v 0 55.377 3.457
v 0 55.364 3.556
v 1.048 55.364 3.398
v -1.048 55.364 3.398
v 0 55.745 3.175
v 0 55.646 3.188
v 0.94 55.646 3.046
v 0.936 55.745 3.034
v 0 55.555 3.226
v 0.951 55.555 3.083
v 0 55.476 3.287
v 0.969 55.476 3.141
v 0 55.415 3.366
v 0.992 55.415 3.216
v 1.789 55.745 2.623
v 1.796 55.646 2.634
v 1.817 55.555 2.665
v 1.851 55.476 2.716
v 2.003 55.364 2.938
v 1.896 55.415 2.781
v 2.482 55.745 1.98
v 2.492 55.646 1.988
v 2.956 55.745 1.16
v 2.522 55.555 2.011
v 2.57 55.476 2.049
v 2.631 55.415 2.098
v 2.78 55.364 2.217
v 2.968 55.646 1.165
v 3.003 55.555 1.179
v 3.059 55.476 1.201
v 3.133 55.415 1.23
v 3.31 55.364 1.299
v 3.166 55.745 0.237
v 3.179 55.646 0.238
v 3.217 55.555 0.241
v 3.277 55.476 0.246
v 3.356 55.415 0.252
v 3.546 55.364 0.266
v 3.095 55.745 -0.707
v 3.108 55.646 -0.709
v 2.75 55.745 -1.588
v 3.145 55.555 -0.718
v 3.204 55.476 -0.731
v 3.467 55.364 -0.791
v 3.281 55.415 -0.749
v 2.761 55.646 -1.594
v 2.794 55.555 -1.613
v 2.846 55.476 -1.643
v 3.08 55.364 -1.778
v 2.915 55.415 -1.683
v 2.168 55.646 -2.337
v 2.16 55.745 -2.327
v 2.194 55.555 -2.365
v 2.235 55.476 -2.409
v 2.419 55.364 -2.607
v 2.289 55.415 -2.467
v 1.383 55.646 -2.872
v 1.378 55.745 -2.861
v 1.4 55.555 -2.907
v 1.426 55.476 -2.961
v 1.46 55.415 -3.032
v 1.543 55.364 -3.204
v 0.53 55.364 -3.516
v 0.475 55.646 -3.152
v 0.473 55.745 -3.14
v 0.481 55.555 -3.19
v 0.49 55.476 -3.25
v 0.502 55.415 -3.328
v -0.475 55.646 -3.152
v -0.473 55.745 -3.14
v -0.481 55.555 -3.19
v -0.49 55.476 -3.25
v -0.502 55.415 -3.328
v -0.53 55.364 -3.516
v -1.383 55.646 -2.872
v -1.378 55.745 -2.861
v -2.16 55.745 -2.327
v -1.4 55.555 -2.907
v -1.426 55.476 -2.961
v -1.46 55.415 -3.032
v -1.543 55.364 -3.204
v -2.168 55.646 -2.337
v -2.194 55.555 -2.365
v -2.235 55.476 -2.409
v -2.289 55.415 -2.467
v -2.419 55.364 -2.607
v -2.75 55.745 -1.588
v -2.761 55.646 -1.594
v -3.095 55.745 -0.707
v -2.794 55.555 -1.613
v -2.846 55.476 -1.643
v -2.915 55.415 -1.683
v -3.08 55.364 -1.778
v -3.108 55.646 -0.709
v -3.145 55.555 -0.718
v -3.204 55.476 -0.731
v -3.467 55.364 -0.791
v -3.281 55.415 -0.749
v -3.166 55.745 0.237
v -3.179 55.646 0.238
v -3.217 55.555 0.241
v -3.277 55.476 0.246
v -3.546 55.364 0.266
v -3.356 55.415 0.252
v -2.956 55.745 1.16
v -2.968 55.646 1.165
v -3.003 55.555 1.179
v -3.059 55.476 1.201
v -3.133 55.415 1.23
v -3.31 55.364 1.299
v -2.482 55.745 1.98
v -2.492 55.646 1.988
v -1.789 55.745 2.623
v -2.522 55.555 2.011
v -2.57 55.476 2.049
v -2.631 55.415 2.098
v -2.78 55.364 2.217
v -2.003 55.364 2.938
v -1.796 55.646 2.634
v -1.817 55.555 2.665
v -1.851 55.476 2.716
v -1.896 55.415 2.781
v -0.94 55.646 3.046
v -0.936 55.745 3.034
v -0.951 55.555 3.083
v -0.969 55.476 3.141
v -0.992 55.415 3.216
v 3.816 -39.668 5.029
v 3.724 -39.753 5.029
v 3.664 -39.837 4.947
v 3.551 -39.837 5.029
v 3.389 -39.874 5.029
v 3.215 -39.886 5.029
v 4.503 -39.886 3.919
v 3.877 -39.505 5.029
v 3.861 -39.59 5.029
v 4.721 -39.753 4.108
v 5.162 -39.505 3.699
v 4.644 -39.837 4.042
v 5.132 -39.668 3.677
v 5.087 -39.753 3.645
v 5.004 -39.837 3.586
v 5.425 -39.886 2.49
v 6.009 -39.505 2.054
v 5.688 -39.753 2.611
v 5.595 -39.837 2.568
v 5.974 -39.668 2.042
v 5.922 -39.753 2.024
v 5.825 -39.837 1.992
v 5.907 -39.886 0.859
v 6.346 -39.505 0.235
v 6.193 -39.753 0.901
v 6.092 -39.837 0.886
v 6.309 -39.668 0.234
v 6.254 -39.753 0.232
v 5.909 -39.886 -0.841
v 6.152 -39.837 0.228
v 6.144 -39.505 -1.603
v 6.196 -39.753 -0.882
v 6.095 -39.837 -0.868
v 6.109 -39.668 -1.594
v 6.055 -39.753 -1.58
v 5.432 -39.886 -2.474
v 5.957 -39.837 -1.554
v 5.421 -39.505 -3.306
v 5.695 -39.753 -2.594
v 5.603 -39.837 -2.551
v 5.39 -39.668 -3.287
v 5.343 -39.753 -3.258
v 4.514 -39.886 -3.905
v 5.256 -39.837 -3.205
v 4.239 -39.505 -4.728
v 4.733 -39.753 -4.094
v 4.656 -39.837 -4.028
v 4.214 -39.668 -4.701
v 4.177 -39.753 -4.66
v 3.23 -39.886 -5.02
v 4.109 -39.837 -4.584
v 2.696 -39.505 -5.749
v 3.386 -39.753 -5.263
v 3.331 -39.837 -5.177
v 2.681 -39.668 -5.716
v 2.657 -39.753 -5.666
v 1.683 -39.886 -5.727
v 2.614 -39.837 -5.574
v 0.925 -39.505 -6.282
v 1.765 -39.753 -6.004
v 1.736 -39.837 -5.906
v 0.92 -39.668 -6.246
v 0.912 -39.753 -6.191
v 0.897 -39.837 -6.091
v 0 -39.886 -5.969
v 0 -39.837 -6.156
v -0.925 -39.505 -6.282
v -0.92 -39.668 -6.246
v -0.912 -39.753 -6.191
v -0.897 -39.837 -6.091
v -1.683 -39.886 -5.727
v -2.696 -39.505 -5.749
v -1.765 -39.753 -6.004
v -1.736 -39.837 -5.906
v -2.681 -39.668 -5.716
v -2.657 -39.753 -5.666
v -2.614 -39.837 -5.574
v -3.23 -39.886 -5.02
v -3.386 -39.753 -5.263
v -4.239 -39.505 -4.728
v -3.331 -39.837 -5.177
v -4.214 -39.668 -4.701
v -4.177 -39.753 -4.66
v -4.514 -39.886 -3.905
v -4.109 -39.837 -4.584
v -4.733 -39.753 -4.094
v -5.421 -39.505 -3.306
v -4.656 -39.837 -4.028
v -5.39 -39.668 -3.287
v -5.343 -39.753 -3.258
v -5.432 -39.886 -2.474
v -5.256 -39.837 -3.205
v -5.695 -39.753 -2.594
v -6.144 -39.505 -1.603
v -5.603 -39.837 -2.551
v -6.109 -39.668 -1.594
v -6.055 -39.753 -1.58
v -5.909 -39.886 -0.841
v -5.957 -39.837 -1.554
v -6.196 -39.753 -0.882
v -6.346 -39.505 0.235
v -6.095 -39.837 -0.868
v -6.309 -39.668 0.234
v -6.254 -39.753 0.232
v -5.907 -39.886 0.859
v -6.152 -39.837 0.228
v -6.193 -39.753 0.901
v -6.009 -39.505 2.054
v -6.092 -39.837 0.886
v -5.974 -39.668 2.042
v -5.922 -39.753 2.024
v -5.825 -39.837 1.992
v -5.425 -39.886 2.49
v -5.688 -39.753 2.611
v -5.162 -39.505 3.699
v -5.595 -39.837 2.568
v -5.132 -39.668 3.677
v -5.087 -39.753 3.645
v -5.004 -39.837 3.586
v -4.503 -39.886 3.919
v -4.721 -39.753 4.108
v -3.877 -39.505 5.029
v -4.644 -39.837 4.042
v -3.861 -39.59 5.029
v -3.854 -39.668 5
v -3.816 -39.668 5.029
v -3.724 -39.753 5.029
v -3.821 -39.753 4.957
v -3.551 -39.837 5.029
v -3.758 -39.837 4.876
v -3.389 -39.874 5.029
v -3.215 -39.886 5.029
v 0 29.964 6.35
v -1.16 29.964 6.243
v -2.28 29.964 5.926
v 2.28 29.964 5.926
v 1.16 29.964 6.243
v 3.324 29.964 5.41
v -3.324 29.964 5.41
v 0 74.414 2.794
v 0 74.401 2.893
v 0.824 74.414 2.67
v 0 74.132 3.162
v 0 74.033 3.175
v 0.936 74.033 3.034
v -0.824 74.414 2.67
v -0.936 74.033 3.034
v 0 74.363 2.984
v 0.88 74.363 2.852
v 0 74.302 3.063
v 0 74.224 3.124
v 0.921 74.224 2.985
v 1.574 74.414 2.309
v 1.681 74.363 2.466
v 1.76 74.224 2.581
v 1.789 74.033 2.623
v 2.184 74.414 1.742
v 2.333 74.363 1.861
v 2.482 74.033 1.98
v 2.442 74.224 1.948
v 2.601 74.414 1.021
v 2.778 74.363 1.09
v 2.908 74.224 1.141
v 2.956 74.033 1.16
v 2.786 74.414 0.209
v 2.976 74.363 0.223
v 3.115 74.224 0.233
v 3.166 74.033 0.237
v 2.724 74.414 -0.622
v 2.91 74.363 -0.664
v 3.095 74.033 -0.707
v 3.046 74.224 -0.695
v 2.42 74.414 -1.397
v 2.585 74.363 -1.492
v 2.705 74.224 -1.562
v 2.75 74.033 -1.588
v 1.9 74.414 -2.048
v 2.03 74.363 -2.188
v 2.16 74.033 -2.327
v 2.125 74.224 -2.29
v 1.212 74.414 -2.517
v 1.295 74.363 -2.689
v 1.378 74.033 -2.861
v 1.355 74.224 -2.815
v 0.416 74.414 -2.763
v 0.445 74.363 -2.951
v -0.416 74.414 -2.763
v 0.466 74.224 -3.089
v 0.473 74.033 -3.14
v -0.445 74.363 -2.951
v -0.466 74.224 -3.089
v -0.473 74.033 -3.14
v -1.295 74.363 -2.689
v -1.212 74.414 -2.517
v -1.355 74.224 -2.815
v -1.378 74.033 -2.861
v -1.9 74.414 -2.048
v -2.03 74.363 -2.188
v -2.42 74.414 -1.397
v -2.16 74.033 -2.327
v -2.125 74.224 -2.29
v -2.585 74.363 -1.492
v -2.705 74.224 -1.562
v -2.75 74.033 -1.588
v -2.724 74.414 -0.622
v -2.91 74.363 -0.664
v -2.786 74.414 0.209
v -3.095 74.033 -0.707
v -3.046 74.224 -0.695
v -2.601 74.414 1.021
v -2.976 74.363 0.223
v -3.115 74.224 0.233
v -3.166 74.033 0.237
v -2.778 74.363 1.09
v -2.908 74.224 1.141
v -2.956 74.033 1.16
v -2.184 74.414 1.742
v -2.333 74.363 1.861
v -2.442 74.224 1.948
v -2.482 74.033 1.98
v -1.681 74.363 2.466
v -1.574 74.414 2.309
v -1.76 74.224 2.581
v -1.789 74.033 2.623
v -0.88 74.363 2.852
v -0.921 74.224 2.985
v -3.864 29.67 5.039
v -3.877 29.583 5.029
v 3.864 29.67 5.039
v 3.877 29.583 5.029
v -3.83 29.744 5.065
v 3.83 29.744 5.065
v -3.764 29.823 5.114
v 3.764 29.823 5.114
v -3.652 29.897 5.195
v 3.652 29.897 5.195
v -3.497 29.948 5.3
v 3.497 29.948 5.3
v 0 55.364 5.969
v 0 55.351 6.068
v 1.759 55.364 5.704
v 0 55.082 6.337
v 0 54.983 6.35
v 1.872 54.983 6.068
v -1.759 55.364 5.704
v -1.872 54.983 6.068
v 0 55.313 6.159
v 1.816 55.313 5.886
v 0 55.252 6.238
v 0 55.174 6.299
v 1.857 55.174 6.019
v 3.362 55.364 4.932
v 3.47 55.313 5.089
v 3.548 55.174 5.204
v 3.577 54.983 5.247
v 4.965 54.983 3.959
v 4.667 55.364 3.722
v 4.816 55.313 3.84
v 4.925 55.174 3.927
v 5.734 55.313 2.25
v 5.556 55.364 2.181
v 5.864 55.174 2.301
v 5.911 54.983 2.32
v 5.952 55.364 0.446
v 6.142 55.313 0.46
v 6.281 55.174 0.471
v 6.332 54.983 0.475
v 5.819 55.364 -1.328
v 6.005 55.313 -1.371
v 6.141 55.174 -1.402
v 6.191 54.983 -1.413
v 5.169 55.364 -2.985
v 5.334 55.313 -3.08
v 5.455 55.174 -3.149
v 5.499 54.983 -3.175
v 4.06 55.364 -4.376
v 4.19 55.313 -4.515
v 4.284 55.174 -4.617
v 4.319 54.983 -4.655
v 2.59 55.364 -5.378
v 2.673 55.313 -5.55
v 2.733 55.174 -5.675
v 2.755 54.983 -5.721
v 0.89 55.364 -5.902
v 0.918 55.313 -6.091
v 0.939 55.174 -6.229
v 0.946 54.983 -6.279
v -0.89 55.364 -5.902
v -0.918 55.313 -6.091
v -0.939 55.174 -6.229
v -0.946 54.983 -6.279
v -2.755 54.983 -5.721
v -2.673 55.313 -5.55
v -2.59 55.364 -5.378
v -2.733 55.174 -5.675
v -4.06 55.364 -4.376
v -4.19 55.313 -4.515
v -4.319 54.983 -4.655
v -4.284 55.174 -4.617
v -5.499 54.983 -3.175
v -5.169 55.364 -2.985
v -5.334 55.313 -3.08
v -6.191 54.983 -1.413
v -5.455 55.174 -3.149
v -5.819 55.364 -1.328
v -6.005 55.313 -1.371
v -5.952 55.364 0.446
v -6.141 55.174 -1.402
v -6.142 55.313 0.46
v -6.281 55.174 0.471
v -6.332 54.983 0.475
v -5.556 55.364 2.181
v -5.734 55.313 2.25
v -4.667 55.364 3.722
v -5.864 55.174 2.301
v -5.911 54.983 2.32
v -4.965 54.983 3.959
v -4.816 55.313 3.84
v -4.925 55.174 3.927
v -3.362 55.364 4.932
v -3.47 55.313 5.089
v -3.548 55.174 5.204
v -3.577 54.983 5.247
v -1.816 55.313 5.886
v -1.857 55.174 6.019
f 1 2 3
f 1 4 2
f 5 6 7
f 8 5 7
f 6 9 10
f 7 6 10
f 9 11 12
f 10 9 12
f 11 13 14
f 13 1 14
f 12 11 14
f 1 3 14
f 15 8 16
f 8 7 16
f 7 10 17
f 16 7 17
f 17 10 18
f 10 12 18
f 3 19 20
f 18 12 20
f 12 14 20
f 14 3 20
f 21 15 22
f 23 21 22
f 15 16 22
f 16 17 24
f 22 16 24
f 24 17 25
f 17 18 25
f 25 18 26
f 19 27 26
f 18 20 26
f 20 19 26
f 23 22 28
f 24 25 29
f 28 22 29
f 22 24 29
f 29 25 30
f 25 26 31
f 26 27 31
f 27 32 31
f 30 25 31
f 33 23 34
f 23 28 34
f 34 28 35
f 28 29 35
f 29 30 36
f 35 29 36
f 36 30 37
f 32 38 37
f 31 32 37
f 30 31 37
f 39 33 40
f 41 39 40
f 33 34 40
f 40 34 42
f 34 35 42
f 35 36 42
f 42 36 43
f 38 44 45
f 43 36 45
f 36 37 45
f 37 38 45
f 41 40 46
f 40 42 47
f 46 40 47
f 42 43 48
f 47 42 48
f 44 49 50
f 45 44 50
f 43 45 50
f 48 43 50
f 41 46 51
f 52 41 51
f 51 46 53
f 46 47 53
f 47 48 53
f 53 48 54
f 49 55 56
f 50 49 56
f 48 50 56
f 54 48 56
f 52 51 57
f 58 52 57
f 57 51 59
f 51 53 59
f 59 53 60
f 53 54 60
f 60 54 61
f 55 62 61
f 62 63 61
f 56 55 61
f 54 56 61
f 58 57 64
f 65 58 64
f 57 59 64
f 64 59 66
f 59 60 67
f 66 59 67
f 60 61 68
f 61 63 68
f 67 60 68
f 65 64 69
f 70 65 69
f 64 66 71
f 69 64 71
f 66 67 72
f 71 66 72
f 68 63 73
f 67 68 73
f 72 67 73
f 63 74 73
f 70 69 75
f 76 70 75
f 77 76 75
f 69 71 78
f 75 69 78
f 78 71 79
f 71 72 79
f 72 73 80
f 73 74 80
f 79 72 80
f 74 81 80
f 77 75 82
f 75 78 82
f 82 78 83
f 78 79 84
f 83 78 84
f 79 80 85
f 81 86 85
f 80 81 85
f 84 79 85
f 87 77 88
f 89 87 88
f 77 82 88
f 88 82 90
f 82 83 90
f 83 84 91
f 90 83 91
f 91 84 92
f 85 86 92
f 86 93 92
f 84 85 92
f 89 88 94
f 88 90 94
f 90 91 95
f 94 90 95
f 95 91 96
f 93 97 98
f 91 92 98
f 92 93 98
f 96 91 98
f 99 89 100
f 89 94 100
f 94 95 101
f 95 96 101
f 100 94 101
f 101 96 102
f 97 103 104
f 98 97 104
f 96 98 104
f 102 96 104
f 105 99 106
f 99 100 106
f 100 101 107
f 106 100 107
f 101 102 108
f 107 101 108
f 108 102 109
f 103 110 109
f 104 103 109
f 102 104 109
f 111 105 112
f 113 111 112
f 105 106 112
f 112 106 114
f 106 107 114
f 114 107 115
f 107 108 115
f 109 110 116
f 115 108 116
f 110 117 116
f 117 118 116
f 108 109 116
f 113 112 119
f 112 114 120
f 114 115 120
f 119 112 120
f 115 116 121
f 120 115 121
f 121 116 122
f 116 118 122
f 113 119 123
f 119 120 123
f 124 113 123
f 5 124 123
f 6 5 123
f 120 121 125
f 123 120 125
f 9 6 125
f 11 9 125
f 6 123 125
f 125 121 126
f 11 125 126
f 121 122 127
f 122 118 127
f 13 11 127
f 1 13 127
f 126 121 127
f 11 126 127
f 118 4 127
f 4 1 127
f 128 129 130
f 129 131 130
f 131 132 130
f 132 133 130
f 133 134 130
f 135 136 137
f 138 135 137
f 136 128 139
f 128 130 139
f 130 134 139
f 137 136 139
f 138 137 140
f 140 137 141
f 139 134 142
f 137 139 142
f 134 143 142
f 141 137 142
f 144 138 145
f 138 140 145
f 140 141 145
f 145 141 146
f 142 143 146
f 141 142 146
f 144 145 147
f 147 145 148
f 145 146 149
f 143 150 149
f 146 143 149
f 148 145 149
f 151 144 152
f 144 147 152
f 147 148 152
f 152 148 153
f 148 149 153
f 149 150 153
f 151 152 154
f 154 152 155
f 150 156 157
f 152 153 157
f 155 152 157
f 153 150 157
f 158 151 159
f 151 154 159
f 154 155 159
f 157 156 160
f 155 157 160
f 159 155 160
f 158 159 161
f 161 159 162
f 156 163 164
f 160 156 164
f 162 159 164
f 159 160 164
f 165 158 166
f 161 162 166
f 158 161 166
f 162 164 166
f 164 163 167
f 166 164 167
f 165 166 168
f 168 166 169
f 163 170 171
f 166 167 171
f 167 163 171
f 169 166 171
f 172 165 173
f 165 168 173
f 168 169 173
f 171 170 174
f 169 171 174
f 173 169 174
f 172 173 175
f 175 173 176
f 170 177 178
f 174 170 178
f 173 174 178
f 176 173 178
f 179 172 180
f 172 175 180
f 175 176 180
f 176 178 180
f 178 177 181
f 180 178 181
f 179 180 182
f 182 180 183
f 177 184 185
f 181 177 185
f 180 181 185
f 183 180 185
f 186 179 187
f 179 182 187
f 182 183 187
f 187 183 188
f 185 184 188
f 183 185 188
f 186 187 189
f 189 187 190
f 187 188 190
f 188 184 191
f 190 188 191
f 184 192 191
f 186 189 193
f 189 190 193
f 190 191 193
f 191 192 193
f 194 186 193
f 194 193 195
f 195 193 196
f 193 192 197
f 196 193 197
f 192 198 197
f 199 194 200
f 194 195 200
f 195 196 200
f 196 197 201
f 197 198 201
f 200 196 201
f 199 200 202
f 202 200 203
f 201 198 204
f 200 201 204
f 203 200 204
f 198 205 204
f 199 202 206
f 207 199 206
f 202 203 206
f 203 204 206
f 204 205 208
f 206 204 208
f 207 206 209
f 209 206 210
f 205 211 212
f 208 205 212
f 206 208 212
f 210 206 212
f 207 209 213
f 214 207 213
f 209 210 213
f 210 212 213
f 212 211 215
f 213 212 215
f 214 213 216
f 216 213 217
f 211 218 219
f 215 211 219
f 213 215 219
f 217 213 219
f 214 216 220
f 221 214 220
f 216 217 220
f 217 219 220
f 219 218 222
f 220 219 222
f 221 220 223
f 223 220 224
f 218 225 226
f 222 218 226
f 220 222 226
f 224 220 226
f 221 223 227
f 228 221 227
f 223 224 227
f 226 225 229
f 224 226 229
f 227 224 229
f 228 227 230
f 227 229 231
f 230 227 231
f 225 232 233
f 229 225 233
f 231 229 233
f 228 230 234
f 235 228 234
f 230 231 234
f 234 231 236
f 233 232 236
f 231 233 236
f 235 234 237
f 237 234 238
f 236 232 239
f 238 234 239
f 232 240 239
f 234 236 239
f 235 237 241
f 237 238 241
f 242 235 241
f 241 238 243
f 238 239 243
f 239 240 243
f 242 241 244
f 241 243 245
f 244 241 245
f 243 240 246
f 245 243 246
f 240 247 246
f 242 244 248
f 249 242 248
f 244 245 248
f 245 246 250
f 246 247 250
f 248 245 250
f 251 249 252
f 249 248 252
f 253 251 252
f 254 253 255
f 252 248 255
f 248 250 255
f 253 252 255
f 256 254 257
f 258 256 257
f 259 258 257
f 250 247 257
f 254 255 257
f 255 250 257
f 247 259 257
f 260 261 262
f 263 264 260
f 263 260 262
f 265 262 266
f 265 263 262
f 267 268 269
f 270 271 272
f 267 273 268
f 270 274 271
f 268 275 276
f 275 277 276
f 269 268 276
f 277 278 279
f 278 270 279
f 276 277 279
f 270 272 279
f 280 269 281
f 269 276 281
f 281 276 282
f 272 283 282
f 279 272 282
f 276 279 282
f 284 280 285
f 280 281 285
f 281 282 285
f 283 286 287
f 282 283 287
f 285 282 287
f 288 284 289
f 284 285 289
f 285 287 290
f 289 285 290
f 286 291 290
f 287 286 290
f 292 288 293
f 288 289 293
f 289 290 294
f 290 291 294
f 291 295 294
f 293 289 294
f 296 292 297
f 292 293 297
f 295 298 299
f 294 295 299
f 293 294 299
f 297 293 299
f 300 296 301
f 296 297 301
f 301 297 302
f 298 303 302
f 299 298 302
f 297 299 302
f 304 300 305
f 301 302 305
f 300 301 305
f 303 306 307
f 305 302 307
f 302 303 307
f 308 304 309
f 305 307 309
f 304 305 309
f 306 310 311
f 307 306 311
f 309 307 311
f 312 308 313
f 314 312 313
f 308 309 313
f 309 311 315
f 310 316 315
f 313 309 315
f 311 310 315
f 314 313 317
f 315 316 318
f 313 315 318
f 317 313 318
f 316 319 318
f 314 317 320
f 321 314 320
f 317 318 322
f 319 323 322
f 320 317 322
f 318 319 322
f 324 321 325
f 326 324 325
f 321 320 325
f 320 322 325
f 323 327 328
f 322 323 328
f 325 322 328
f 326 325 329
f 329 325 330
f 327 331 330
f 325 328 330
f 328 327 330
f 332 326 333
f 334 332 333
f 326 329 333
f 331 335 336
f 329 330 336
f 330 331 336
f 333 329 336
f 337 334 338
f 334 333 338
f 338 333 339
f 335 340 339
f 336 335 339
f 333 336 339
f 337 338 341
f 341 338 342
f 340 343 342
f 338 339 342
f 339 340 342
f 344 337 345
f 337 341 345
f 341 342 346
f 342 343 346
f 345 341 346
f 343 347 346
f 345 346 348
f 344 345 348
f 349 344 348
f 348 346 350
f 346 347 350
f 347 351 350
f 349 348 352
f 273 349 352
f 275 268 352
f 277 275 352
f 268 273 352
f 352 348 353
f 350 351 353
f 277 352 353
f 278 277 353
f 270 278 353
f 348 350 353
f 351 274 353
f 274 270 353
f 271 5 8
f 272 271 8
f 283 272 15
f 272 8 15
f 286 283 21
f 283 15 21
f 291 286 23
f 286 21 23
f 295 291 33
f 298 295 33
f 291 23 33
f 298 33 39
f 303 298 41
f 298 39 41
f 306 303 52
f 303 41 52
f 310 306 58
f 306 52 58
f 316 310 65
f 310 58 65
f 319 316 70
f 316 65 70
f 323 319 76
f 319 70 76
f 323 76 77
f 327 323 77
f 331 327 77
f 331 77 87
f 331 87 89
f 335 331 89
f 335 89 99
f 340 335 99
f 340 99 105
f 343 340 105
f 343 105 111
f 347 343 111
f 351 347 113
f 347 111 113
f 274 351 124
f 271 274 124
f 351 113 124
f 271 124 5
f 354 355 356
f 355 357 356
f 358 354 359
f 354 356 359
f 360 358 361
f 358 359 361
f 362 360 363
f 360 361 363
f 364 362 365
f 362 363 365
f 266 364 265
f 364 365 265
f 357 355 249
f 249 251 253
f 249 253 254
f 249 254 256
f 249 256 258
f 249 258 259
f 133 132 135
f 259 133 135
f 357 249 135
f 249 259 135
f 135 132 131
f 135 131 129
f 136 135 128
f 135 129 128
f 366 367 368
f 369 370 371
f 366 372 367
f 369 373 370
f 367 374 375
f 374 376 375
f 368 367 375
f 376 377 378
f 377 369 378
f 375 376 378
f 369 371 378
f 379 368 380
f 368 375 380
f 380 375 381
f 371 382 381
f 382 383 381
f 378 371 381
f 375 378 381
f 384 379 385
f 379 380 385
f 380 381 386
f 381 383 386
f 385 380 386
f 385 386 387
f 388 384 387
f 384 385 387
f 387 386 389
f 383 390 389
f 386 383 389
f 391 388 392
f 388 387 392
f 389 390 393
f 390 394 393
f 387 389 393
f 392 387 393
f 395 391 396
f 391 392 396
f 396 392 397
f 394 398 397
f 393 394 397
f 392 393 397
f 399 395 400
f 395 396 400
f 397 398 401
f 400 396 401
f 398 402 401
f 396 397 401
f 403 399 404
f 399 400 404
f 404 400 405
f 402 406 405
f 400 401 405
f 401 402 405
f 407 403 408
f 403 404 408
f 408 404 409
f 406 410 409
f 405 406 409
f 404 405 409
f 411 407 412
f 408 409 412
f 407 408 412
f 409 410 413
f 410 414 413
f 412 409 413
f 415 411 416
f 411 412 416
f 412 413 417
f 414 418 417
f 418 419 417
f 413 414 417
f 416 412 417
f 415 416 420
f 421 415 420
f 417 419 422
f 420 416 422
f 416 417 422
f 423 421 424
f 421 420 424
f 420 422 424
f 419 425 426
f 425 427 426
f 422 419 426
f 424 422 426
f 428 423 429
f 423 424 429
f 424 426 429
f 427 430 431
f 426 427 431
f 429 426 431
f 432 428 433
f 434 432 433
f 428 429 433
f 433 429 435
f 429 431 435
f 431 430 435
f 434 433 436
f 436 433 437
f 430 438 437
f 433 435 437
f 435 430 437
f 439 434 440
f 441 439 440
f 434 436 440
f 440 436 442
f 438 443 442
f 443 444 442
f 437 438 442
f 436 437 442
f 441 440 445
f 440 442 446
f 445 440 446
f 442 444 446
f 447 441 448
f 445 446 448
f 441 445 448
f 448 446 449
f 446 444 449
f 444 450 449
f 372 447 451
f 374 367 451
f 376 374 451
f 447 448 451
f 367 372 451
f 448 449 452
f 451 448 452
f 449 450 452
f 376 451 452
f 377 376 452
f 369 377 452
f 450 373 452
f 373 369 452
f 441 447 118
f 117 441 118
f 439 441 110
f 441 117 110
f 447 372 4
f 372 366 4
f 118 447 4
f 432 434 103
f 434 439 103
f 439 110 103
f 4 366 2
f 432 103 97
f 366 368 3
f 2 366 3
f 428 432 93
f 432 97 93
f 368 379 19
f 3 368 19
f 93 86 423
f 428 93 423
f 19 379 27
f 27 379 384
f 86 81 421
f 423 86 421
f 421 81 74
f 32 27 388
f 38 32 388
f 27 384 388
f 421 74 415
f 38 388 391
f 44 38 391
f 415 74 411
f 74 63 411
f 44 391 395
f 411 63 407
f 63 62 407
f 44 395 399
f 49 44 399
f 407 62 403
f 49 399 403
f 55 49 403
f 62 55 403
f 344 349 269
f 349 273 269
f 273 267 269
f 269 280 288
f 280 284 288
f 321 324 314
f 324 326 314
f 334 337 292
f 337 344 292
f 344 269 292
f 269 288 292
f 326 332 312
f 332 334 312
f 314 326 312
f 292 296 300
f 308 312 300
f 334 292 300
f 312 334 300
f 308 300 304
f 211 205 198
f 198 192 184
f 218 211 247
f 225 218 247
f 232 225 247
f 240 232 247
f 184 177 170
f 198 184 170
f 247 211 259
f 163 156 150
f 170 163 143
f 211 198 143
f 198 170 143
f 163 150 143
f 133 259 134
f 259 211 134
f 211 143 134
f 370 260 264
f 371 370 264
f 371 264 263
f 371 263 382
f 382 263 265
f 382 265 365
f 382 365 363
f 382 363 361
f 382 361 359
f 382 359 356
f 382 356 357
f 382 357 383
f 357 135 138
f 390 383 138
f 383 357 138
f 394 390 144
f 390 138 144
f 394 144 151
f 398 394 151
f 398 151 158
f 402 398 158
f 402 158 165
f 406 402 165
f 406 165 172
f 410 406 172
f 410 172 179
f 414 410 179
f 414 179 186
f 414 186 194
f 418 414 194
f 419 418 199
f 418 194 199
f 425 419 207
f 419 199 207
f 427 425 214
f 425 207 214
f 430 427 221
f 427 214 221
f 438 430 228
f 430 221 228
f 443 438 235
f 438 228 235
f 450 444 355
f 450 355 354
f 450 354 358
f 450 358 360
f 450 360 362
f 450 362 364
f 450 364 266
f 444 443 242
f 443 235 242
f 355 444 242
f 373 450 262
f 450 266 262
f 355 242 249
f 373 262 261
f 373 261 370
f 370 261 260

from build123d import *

# Parameters (mm, degrees)
F3_DEPTH = 69.85
F4_R     = 0.381
F5_R     = 0.381
F6_R     = 0.381


with BuildPart() as f1:
    # F0 (on Right) → F1 (revolve)
    with BuildSketch(Plane.YZ):
        Polygon((74.4140613498, 0), (74.4140613498, 3.175), (55.3640613498, 3.175), (55.3640613498, 6.35), (-39.8859386502, 6.35), (-39.8859386502, 0), align=None)
    revolve(axis=Axis((0, 17.2640613498, 0), (0, 1, 0)))

    # F2 (on face) → F3 (cut)
    with BuildSketch(Plane.XZ.offset(39.8859386502)):
        with BuildLine():
            ThreePointArc((3.8766764739, 5.0293020904), (0, 6.35), (-3.8766764739, 5.0293020904))
            Line((-3.8766764739, 5.0293020904), (3.8766764739, 5.0293020904))
        make_face()
    extrude(amount=-F3_DEPTH, mode=Mode.SUBTRACT)

    # F4
    f4_edges = [f1.edges().sort_by_distance(p)[0] for p in [
        (0, 55.364061, -6.35),
        (0, 74.414061, -3.175),
        (0, 55.364061, -3.175),
        (0, 64.889061, 3.175),
    ]]
    fillet(f4_edges, radius=F4_R)

    # F5
    f5_edges = [f1.edges().sort_by_distance(p)[0] for p in [
        (0, -39.885939, -6.35),
    ]]
    fillet(f5_edges, radius=F5_R)

    # F6
    f6_edges = [f1.edges().sort_by_distance(p)[0] for p in [
        (0, 29.964061, 5.029302),
    ]]
    fillet(f6_edges, radius=F6_R)


solid = f1.part
